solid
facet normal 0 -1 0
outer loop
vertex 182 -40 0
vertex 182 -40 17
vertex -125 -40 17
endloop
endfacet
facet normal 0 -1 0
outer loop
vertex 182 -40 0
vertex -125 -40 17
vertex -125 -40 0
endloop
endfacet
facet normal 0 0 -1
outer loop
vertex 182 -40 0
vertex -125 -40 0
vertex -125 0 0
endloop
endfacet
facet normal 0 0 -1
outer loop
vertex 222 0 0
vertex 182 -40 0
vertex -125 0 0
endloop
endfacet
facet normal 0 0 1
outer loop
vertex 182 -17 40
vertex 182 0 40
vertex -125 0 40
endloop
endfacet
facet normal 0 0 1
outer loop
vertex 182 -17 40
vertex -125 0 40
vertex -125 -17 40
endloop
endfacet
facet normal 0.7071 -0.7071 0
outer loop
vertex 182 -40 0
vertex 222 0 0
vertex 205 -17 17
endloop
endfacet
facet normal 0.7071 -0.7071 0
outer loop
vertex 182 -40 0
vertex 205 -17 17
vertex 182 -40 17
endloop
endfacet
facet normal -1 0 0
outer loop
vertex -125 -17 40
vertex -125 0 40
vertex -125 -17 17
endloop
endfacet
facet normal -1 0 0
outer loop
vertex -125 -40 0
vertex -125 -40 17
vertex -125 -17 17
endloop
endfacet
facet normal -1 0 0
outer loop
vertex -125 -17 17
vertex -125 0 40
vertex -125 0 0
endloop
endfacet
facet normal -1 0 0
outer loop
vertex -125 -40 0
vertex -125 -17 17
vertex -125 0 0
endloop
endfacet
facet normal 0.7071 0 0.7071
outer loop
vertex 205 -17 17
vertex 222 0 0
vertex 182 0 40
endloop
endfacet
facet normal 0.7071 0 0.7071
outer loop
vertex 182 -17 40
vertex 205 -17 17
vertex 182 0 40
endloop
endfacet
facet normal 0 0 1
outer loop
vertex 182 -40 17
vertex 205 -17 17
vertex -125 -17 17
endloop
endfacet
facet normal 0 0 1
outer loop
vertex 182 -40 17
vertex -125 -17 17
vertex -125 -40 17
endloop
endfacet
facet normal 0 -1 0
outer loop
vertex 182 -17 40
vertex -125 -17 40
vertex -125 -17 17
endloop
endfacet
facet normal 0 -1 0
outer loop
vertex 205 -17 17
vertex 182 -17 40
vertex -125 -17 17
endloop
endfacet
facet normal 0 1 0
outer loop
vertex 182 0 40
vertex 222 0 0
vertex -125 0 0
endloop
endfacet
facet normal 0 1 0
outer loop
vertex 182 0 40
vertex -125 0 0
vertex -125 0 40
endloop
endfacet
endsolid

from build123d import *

# Parameters (mm, degrees)
BOSS_EXTRU_1_START      = -125
BOSS_EXTRU_1_DEPTH      = 347
ENL_V_MAT_EXTRU_1_DEPTH = 41
ENL_V_MAT_EXTRU_2_DEPTH = 41


with BuildPart() as part:
    # Esquisse1 → Boss.-Extru.1 (new body)
    with BuildSketch(Plane(origin=(0, 0, 0), x_dir=(0, 0, -1), z_dir=(1, 0, 0)).offset(BOSS_EXTRU_1_START)):
        Polygon((0, 0), (-40, 0), (-40, -17), (-17, -17), (-17, -40), (0, -40), align=None)
    extrude(amount=BOSS_EXTRU_1_DEPTH)

    # Esquisse2 → Enlèv. mat.-Extru.1 (cut, through all)
    with BuildSketch(Plane(origin=(0, 0, 0), x_dir=(1, 0, 0), z_dir=(0, 1, 0))):
        Polygon((222, 0), (182, -40), (222, -40), align=None)
    extrude(amount=-ENL_V_MAT_EXTRU_1_DEPTH, mode=Mode.SUBTRACT)

    # Esquisse3 → Enlèv. mat.-Extru.2 (cut, through all)
    with BuildSketch(Plane(origin=(0, 0, 0), x_dir=(-1, 0, 0), z_dir=(0, 0, -1))):
        Polygon((-222, 0), (-182, -40), (-222, -40), align=None)
    extrude(amount=-ENL_V_MAT_EXTRU_2_DEPTH, mode=Mode.SUBTRACT)


solid = part.part
